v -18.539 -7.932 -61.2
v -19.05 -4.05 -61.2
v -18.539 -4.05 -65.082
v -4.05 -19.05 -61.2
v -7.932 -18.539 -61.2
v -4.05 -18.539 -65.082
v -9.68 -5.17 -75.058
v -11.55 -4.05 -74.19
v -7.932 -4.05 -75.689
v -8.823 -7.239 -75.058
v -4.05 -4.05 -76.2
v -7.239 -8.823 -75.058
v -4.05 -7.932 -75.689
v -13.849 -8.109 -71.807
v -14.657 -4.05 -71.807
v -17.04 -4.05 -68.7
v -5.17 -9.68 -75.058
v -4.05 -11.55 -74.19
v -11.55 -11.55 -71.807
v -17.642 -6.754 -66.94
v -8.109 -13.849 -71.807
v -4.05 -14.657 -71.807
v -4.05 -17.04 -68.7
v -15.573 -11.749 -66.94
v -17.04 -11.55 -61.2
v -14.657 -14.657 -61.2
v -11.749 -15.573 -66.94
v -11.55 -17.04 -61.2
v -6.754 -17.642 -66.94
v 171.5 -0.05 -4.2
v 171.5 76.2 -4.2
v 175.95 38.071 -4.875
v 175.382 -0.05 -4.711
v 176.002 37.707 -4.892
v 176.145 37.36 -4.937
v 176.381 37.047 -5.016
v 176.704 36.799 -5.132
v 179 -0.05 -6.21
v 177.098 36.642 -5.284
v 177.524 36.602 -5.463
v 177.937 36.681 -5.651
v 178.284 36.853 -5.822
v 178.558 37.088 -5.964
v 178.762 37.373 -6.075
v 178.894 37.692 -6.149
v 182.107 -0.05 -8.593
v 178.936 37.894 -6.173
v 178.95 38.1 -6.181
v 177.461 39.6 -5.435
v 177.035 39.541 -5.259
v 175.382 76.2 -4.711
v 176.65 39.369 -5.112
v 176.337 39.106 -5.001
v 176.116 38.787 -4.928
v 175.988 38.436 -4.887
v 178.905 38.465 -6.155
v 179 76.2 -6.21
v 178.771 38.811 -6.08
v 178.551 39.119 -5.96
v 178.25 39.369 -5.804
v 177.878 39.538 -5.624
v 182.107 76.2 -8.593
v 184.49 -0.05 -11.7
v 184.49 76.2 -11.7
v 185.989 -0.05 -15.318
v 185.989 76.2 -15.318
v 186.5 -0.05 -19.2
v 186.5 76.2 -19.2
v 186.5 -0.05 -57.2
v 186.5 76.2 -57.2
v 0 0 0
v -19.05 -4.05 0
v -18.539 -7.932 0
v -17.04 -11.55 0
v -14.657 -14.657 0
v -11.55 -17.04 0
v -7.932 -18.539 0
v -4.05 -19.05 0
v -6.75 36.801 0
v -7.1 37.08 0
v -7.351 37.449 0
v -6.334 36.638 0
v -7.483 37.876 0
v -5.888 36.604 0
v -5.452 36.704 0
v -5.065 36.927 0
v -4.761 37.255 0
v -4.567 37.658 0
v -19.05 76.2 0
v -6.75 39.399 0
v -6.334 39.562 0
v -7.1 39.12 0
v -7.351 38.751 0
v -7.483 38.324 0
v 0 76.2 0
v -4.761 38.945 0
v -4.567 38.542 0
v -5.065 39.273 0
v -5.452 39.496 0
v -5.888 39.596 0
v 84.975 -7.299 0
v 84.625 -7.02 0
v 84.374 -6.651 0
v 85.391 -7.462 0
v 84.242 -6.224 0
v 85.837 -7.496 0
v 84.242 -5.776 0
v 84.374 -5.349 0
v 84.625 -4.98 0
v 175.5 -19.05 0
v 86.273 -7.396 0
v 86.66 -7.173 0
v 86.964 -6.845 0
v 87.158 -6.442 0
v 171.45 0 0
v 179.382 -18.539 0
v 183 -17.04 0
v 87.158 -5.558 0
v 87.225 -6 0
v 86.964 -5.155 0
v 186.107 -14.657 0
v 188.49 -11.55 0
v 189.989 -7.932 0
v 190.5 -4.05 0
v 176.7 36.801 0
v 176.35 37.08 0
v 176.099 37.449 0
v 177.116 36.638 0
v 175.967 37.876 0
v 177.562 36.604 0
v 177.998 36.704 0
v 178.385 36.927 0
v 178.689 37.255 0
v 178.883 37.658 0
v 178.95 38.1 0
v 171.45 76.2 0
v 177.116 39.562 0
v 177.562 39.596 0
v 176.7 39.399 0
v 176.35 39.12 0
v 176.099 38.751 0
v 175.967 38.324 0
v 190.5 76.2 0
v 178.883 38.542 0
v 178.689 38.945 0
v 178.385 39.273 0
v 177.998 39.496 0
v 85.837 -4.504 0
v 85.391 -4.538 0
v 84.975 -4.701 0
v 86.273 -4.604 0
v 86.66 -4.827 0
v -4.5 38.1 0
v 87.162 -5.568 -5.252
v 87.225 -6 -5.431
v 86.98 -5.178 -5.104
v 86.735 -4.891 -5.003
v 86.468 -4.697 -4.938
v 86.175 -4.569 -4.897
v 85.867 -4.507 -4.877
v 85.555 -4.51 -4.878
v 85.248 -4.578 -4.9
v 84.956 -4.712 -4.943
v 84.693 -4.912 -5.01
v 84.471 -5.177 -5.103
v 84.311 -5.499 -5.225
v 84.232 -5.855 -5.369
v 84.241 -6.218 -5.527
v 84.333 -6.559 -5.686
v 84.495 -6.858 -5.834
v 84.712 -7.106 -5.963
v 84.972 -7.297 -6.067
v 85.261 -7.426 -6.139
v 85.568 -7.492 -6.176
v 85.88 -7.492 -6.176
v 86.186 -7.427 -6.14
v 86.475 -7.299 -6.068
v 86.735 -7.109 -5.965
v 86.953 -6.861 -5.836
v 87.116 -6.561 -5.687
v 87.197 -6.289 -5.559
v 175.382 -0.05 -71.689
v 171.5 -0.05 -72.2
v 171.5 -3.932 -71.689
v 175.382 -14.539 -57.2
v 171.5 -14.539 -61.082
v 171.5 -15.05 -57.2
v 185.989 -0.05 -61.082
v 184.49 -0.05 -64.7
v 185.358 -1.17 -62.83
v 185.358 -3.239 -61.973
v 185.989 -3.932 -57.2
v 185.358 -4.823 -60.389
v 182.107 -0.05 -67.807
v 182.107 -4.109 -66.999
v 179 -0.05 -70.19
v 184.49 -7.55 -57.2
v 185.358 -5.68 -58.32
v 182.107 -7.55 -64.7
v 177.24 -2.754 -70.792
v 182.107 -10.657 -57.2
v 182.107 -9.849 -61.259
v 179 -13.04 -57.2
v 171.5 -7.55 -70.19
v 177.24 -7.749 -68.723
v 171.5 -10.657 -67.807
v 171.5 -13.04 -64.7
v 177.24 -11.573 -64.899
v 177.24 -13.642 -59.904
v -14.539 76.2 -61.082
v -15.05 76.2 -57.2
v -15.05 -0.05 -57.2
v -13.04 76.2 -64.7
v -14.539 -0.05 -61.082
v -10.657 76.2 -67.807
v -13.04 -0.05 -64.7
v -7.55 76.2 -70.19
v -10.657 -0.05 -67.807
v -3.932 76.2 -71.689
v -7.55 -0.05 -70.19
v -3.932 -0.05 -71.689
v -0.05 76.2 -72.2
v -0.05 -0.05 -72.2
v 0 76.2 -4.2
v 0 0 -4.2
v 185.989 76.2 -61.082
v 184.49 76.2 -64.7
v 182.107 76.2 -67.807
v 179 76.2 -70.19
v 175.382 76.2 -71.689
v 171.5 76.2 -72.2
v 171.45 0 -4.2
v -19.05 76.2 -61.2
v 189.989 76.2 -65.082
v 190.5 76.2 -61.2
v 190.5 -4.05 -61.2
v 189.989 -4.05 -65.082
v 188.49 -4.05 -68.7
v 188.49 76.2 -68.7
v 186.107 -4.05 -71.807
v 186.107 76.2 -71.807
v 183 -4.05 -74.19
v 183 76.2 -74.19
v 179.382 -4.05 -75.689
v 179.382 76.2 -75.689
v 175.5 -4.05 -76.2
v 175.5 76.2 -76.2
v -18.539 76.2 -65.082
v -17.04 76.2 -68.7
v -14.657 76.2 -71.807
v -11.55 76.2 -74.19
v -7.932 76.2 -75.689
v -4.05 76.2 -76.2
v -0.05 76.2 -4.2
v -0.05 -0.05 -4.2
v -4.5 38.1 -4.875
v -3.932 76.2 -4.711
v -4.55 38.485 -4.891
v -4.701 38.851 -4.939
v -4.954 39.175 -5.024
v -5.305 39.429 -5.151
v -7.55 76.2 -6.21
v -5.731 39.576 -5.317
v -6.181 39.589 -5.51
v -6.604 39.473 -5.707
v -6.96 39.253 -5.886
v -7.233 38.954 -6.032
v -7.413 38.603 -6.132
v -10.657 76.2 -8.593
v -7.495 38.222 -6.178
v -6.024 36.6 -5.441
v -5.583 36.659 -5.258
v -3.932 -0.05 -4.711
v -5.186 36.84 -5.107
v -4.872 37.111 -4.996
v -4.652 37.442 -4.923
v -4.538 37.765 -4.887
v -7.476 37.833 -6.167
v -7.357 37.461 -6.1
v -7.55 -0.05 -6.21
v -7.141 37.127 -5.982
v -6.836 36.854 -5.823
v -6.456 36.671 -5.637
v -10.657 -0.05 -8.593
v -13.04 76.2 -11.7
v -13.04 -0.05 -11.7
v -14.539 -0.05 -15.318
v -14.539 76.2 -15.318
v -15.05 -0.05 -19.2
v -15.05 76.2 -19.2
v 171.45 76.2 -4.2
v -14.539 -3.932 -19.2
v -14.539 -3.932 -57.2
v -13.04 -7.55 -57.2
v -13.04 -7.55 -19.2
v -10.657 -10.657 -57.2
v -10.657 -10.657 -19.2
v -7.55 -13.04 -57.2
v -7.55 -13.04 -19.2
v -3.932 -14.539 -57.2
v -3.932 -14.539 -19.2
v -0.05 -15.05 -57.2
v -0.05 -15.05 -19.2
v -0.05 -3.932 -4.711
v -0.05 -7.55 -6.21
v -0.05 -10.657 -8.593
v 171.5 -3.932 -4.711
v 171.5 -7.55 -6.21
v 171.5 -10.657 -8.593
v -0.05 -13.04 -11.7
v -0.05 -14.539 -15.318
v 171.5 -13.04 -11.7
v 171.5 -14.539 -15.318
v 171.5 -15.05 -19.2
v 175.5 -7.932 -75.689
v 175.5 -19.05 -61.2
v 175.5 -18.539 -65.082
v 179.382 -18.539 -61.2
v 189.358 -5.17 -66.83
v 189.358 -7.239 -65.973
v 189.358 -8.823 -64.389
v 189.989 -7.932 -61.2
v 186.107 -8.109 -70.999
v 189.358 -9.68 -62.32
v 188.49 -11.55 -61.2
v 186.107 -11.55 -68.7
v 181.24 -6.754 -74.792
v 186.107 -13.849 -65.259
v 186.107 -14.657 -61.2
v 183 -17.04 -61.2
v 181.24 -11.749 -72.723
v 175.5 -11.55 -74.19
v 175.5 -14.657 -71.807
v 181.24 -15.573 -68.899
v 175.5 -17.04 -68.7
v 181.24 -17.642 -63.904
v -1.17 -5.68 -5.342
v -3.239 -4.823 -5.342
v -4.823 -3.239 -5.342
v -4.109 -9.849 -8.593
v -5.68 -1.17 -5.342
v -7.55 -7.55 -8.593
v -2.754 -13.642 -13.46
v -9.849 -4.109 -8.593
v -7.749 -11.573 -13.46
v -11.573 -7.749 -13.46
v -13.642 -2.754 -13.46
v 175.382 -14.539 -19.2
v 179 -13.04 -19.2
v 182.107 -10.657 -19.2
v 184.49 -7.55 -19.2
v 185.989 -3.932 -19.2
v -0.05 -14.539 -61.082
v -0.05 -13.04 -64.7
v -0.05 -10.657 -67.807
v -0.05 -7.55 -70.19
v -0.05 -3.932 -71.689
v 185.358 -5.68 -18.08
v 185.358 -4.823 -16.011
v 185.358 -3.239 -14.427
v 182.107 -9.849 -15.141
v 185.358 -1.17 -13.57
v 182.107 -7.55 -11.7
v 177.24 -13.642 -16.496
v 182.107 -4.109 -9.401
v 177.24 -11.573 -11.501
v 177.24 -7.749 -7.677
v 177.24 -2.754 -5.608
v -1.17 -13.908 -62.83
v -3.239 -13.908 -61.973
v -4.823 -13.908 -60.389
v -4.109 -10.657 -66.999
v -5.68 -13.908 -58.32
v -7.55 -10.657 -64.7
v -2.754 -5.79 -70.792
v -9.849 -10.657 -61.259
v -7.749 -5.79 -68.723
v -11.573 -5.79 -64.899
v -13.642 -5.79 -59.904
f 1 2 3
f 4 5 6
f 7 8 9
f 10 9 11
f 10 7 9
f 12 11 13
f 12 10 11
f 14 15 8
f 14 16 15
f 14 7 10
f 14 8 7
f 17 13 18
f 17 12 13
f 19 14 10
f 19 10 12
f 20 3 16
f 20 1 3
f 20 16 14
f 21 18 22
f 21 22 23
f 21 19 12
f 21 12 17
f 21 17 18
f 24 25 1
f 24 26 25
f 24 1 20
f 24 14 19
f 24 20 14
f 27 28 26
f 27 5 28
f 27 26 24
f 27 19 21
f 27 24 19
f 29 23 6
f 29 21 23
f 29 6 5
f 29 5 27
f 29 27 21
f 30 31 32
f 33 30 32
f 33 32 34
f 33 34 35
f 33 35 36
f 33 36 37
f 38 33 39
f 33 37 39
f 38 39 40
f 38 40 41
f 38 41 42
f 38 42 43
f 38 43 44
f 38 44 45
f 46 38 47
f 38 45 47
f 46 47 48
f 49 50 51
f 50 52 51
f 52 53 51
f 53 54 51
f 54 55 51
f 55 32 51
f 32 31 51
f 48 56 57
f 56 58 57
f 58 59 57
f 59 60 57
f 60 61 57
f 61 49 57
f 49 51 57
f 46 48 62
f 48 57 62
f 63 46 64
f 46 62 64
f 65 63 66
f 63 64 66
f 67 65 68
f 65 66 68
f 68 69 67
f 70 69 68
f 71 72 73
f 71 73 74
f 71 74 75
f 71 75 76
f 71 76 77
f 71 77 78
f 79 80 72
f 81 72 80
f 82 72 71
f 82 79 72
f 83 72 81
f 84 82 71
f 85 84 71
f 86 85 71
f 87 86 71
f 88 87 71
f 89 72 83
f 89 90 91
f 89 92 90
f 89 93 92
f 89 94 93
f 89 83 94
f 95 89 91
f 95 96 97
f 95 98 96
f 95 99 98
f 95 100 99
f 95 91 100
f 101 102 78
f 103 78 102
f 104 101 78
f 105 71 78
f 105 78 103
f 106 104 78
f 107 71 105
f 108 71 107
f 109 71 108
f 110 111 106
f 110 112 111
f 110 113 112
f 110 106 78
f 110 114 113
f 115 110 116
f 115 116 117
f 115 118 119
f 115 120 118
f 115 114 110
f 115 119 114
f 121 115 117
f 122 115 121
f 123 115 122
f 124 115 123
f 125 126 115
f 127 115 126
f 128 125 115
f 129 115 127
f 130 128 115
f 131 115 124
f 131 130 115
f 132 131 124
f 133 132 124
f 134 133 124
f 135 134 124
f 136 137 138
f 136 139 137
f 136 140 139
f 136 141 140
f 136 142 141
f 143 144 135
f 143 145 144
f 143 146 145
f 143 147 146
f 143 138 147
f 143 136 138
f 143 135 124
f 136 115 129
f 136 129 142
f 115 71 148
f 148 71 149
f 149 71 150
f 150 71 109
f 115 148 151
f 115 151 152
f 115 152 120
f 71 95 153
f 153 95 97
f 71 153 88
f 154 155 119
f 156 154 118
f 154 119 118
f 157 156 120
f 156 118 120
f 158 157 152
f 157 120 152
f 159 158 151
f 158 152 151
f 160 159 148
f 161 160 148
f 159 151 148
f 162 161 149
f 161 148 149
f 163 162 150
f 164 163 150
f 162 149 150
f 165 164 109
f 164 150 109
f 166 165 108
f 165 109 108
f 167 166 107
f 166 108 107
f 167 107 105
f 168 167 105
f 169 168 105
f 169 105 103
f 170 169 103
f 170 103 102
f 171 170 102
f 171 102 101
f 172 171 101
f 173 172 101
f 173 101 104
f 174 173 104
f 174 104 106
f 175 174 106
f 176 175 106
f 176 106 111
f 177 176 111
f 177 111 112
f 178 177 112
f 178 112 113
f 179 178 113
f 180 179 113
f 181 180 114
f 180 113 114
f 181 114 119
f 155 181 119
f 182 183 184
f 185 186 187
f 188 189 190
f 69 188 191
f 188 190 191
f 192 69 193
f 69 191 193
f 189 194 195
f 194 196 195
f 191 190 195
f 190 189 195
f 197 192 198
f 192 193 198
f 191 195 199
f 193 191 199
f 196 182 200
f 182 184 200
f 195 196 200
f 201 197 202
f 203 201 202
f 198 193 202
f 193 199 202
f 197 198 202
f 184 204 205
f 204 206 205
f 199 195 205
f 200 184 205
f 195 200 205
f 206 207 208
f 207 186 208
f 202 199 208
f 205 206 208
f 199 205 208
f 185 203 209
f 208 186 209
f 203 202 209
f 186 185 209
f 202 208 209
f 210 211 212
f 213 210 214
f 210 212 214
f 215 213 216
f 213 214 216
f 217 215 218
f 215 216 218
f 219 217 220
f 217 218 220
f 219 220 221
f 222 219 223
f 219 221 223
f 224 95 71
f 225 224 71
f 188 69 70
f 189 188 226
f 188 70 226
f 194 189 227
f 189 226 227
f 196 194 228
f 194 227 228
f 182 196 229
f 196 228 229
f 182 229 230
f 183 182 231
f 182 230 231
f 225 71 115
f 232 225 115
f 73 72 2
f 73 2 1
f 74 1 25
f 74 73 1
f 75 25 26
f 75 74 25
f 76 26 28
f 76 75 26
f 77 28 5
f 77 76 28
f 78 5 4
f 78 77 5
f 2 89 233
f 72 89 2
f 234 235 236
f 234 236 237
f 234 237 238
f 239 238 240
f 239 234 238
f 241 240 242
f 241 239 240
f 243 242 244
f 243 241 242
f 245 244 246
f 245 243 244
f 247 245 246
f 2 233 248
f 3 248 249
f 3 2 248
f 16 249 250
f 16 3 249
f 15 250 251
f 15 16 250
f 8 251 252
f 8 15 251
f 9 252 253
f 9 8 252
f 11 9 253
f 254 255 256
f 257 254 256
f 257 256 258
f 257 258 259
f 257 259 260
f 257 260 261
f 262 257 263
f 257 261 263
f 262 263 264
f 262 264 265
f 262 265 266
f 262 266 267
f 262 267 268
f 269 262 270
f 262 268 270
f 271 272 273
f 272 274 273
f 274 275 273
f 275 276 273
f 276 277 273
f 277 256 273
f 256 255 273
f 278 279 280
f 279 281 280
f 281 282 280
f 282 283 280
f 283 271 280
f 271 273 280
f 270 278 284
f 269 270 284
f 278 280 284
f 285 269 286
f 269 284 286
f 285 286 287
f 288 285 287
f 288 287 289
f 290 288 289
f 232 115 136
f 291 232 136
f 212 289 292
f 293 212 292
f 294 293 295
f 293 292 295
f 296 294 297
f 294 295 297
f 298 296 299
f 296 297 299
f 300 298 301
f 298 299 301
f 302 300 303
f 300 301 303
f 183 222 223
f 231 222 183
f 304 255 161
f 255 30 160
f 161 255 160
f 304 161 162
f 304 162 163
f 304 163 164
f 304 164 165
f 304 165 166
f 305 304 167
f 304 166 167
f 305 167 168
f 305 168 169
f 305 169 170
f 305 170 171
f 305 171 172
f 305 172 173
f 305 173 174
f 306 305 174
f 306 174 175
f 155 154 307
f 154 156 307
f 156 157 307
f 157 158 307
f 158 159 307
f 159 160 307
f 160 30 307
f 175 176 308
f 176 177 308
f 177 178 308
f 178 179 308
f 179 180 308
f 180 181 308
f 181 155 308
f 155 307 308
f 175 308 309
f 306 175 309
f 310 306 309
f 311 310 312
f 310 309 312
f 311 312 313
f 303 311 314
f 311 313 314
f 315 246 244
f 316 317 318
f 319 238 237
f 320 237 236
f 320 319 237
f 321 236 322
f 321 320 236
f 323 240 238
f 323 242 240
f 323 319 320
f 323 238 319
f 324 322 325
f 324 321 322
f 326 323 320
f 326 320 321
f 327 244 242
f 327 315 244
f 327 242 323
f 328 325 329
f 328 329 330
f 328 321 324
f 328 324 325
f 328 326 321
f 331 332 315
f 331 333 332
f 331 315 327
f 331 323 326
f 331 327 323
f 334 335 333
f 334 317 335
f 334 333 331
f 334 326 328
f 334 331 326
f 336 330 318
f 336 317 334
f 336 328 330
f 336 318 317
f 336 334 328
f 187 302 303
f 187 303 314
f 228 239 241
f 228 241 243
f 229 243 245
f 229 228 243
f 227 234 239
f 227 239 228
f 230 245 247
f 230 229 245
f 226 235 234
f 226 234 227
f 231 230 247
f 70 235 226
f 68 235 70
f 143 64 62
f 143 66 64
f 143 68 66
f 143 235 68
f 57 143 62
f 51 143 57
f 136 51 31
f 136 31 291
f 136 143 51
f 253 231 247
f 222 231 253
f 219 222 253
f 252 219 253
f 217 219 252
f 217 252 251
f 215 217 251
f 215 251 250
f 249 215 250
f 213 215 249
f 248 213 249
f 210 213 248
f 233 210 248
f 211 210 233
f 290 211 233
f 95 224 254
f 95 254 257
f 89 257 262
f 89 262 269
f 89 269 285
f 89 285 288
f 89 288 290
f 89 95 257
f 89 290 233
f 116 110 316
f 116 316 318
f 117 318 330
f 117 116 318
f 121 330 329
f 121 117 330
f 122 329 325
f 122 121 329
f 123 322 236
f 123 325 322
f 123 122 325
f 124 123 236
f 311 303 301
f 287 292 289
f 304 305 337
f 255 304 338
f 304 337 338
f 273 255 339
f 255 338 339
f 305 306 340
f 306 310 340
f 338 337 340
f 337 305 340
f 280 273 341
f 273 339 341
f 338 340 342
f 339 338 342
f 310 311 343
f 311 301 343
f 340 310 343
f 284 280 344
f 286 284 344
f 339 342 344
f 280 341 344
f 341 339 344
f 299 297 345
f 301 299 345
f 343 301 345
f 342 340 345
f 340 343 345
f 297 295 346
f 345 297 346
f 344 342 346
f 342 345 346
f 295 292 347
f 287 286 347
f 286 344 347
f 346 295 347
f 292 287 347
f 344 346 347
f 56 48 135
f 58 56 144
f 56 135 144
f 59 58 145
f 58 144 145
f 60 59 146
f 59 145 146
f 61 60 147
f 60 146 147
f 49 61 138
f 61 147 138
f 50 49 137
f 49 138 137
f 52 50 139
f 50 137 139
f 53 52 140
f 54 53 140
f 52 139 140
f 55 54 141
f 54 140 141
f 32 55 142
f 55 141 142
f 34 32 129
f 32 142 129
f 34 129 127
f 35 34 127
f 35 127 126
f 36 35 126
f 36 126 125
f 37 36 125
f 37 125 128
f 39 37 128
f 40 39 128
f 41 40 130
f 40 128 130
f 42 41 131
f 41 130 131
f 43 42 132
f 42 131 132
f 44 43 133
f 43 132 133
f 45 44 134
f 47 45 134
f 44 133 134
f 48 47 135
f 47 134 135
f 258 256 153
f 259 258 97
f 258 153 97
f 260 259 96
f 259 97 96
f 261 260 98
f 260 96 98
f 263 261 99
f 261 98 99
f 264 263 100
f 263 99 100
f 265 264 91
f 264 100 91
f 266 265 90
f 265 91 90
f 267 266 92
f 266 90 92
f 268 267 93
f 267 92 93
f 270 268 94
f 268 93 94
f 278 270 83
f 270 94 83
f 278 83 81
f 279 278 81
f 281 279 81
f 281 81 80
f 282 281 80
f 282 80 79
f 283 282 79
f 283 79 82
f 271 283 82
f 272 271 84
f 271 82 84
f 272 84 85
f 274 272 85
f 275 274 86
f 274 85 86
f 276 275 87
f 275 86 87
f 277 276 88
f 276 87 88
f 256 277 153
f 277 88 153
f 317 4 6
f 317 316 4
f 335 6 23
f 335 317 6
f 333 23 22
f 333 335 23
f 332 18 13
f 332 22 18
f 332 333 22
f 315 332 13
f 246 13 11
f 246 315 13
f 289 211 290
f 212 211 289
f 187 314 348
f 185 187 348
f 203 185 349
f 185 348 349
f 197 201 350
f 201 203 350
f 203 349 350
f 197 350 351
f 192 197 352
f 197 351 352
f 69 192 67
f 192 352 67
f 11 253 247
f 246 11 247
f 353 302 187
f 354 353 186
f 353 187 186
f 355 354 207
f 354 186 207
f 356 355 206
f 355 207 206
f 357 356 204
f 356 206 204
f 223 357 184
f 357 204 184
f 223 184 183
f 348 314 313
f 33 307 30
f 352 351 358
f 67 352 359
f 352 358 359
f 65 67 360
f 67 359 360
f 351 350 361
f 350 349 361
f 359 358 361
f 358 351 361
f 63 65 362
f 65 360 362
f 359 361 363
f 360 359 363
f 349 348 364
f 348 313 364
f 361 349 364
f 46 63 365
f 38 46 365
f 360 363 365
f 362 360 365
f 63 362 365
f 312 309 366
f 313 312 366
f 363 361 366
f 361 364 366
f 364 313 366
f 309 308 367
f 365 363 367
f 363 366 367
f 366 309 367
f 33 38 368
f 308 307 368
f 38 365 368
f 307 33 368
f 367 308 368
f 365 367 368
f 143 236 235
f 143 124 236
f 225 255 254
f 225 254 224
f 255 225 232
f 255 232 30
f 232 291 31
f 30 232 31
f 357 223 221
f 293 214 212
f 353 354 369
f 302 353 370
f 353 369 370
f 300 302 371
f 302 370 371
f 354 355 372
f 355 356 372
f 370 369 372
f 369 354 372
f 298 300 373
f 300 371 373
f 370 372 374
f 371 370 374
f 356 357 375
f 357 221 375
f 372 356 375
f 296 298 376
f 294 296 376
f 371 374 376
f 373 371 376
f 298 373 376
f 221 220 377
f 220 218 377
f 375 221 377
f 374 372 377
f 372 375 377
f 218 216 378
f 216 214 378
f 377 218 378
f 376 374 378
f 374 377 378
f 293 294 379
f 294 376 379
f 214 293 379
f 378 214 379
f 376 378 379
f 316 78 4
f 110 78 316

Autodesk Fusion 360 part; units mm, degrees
sketch "Sketch1" plane through (0, 0, 0) normal (0, 0, 1) x (1, 0, 0)
  line L0 (0, 0) -> (171.45, 0)
  line L1 (171.45, 0) -> (171.45, 76.2)
  line L2 (171.45, 76.2) -> (0, 76.2)
  line L3 (0, 76.2) -> (0, 0)
  line L4 (-19.05, -19.05) -> (190.5, -19.05)
  line L5 (190.5, -19.05) -> (190.5, 95.25)
  line L6 (190.5, 95.25) -> (-19.05, 95.25)
  line L7 (-19.05, 95.25) -> (-19.05, -19.05)
  line L8 (0, 76.2) -> (-19.05, 76.2)
  line L9 (-19.05, 76.2) -> (171.45, 76.2)
  line L10 (171.45, 76.2) -> (190.5, 76.2)
  line L11 (186.5, 91.25) -> (-15.05, 91.25)
  line L12 (-15.05, 91.25) -> (-15.05, -15.05)
  line L13 (-15.05, -15.05) -> (186.5, -15.05)
  line L14 (186.5, -15.05) -> (186.5, 91.25)
  line L15 (0, 38.1) -> (-6, 38.1) construction
  line L16 (171.45, 38.1) -> (177.45, 38.1) construction
  circle A0 centre (-6, 38.1) radius 1.5
  circle A1 centre (177.45, 38.1) radius 1.5
  line L17 (85.725, 0) -> (85.725, -6) construction
  circle A2 centre (85.725, -6) radius 1.5
  dimension "d1" = 171.45
  dimension "d2" = 76.2
  dimension "d3" = 19.05
  dimension "d4" = -4
  dimension "d15" = 6
  dimension "d16" = 6
  dimension "d17" = 3
  dimension "d18" = 3
  dimension "d19" = 6
  dimension "d20" = 3
extrude "Extrude1" add sketch "Sketch1" against normal blind 76.2 contours L0 L1 L3 L8 L9 L10 L12 L13 L14 | L4 L5 L7 L8 L9 L10 L12 L13 L14 | A0 | A1 | A2
extrude "Extrude2" add sketch "Sketch1" along normal blind 4 from surface at -76.2 contours L0 L1 L2 L3 L9 | L0 L1 L3 L8 L9 L10 L12 L13 L14 | L4 L5 L7 L8 L9 L10 L12 L13 L14 | A0 | A1 | A2
extrude "Extrude3" cut sketch "Sketch1" along normal blind 68 from surface at -72.2 contours L0 L1 L3 L8 L9 L10 L12 L13 L14 | A0 | A1 | A2
fillet "Fillet1" radius 15 13 edges at (-15.05, 30.575, -72.2) (85.725, -15.05, -72.2) (-15.05, -15.05, -38.2) (-15.05, 30.575, -4.2) (85.725, -15.05, -4.2) (186.5, 30.575, -4.2) (186.5, 30.575, -72.2) (186.5, -15.05, -38.2) (-19.05, -19.05, -38.1) (-19.05, 28.575, -76.2) (85.725, -19.05, -76.2) (190.5, 28.575, -76.2) (190.5, -19.05, -38.1)
extrude "Extrude4" cut sketch "Sketch1" against normal blind 20 contours A0 | A1 | A2
